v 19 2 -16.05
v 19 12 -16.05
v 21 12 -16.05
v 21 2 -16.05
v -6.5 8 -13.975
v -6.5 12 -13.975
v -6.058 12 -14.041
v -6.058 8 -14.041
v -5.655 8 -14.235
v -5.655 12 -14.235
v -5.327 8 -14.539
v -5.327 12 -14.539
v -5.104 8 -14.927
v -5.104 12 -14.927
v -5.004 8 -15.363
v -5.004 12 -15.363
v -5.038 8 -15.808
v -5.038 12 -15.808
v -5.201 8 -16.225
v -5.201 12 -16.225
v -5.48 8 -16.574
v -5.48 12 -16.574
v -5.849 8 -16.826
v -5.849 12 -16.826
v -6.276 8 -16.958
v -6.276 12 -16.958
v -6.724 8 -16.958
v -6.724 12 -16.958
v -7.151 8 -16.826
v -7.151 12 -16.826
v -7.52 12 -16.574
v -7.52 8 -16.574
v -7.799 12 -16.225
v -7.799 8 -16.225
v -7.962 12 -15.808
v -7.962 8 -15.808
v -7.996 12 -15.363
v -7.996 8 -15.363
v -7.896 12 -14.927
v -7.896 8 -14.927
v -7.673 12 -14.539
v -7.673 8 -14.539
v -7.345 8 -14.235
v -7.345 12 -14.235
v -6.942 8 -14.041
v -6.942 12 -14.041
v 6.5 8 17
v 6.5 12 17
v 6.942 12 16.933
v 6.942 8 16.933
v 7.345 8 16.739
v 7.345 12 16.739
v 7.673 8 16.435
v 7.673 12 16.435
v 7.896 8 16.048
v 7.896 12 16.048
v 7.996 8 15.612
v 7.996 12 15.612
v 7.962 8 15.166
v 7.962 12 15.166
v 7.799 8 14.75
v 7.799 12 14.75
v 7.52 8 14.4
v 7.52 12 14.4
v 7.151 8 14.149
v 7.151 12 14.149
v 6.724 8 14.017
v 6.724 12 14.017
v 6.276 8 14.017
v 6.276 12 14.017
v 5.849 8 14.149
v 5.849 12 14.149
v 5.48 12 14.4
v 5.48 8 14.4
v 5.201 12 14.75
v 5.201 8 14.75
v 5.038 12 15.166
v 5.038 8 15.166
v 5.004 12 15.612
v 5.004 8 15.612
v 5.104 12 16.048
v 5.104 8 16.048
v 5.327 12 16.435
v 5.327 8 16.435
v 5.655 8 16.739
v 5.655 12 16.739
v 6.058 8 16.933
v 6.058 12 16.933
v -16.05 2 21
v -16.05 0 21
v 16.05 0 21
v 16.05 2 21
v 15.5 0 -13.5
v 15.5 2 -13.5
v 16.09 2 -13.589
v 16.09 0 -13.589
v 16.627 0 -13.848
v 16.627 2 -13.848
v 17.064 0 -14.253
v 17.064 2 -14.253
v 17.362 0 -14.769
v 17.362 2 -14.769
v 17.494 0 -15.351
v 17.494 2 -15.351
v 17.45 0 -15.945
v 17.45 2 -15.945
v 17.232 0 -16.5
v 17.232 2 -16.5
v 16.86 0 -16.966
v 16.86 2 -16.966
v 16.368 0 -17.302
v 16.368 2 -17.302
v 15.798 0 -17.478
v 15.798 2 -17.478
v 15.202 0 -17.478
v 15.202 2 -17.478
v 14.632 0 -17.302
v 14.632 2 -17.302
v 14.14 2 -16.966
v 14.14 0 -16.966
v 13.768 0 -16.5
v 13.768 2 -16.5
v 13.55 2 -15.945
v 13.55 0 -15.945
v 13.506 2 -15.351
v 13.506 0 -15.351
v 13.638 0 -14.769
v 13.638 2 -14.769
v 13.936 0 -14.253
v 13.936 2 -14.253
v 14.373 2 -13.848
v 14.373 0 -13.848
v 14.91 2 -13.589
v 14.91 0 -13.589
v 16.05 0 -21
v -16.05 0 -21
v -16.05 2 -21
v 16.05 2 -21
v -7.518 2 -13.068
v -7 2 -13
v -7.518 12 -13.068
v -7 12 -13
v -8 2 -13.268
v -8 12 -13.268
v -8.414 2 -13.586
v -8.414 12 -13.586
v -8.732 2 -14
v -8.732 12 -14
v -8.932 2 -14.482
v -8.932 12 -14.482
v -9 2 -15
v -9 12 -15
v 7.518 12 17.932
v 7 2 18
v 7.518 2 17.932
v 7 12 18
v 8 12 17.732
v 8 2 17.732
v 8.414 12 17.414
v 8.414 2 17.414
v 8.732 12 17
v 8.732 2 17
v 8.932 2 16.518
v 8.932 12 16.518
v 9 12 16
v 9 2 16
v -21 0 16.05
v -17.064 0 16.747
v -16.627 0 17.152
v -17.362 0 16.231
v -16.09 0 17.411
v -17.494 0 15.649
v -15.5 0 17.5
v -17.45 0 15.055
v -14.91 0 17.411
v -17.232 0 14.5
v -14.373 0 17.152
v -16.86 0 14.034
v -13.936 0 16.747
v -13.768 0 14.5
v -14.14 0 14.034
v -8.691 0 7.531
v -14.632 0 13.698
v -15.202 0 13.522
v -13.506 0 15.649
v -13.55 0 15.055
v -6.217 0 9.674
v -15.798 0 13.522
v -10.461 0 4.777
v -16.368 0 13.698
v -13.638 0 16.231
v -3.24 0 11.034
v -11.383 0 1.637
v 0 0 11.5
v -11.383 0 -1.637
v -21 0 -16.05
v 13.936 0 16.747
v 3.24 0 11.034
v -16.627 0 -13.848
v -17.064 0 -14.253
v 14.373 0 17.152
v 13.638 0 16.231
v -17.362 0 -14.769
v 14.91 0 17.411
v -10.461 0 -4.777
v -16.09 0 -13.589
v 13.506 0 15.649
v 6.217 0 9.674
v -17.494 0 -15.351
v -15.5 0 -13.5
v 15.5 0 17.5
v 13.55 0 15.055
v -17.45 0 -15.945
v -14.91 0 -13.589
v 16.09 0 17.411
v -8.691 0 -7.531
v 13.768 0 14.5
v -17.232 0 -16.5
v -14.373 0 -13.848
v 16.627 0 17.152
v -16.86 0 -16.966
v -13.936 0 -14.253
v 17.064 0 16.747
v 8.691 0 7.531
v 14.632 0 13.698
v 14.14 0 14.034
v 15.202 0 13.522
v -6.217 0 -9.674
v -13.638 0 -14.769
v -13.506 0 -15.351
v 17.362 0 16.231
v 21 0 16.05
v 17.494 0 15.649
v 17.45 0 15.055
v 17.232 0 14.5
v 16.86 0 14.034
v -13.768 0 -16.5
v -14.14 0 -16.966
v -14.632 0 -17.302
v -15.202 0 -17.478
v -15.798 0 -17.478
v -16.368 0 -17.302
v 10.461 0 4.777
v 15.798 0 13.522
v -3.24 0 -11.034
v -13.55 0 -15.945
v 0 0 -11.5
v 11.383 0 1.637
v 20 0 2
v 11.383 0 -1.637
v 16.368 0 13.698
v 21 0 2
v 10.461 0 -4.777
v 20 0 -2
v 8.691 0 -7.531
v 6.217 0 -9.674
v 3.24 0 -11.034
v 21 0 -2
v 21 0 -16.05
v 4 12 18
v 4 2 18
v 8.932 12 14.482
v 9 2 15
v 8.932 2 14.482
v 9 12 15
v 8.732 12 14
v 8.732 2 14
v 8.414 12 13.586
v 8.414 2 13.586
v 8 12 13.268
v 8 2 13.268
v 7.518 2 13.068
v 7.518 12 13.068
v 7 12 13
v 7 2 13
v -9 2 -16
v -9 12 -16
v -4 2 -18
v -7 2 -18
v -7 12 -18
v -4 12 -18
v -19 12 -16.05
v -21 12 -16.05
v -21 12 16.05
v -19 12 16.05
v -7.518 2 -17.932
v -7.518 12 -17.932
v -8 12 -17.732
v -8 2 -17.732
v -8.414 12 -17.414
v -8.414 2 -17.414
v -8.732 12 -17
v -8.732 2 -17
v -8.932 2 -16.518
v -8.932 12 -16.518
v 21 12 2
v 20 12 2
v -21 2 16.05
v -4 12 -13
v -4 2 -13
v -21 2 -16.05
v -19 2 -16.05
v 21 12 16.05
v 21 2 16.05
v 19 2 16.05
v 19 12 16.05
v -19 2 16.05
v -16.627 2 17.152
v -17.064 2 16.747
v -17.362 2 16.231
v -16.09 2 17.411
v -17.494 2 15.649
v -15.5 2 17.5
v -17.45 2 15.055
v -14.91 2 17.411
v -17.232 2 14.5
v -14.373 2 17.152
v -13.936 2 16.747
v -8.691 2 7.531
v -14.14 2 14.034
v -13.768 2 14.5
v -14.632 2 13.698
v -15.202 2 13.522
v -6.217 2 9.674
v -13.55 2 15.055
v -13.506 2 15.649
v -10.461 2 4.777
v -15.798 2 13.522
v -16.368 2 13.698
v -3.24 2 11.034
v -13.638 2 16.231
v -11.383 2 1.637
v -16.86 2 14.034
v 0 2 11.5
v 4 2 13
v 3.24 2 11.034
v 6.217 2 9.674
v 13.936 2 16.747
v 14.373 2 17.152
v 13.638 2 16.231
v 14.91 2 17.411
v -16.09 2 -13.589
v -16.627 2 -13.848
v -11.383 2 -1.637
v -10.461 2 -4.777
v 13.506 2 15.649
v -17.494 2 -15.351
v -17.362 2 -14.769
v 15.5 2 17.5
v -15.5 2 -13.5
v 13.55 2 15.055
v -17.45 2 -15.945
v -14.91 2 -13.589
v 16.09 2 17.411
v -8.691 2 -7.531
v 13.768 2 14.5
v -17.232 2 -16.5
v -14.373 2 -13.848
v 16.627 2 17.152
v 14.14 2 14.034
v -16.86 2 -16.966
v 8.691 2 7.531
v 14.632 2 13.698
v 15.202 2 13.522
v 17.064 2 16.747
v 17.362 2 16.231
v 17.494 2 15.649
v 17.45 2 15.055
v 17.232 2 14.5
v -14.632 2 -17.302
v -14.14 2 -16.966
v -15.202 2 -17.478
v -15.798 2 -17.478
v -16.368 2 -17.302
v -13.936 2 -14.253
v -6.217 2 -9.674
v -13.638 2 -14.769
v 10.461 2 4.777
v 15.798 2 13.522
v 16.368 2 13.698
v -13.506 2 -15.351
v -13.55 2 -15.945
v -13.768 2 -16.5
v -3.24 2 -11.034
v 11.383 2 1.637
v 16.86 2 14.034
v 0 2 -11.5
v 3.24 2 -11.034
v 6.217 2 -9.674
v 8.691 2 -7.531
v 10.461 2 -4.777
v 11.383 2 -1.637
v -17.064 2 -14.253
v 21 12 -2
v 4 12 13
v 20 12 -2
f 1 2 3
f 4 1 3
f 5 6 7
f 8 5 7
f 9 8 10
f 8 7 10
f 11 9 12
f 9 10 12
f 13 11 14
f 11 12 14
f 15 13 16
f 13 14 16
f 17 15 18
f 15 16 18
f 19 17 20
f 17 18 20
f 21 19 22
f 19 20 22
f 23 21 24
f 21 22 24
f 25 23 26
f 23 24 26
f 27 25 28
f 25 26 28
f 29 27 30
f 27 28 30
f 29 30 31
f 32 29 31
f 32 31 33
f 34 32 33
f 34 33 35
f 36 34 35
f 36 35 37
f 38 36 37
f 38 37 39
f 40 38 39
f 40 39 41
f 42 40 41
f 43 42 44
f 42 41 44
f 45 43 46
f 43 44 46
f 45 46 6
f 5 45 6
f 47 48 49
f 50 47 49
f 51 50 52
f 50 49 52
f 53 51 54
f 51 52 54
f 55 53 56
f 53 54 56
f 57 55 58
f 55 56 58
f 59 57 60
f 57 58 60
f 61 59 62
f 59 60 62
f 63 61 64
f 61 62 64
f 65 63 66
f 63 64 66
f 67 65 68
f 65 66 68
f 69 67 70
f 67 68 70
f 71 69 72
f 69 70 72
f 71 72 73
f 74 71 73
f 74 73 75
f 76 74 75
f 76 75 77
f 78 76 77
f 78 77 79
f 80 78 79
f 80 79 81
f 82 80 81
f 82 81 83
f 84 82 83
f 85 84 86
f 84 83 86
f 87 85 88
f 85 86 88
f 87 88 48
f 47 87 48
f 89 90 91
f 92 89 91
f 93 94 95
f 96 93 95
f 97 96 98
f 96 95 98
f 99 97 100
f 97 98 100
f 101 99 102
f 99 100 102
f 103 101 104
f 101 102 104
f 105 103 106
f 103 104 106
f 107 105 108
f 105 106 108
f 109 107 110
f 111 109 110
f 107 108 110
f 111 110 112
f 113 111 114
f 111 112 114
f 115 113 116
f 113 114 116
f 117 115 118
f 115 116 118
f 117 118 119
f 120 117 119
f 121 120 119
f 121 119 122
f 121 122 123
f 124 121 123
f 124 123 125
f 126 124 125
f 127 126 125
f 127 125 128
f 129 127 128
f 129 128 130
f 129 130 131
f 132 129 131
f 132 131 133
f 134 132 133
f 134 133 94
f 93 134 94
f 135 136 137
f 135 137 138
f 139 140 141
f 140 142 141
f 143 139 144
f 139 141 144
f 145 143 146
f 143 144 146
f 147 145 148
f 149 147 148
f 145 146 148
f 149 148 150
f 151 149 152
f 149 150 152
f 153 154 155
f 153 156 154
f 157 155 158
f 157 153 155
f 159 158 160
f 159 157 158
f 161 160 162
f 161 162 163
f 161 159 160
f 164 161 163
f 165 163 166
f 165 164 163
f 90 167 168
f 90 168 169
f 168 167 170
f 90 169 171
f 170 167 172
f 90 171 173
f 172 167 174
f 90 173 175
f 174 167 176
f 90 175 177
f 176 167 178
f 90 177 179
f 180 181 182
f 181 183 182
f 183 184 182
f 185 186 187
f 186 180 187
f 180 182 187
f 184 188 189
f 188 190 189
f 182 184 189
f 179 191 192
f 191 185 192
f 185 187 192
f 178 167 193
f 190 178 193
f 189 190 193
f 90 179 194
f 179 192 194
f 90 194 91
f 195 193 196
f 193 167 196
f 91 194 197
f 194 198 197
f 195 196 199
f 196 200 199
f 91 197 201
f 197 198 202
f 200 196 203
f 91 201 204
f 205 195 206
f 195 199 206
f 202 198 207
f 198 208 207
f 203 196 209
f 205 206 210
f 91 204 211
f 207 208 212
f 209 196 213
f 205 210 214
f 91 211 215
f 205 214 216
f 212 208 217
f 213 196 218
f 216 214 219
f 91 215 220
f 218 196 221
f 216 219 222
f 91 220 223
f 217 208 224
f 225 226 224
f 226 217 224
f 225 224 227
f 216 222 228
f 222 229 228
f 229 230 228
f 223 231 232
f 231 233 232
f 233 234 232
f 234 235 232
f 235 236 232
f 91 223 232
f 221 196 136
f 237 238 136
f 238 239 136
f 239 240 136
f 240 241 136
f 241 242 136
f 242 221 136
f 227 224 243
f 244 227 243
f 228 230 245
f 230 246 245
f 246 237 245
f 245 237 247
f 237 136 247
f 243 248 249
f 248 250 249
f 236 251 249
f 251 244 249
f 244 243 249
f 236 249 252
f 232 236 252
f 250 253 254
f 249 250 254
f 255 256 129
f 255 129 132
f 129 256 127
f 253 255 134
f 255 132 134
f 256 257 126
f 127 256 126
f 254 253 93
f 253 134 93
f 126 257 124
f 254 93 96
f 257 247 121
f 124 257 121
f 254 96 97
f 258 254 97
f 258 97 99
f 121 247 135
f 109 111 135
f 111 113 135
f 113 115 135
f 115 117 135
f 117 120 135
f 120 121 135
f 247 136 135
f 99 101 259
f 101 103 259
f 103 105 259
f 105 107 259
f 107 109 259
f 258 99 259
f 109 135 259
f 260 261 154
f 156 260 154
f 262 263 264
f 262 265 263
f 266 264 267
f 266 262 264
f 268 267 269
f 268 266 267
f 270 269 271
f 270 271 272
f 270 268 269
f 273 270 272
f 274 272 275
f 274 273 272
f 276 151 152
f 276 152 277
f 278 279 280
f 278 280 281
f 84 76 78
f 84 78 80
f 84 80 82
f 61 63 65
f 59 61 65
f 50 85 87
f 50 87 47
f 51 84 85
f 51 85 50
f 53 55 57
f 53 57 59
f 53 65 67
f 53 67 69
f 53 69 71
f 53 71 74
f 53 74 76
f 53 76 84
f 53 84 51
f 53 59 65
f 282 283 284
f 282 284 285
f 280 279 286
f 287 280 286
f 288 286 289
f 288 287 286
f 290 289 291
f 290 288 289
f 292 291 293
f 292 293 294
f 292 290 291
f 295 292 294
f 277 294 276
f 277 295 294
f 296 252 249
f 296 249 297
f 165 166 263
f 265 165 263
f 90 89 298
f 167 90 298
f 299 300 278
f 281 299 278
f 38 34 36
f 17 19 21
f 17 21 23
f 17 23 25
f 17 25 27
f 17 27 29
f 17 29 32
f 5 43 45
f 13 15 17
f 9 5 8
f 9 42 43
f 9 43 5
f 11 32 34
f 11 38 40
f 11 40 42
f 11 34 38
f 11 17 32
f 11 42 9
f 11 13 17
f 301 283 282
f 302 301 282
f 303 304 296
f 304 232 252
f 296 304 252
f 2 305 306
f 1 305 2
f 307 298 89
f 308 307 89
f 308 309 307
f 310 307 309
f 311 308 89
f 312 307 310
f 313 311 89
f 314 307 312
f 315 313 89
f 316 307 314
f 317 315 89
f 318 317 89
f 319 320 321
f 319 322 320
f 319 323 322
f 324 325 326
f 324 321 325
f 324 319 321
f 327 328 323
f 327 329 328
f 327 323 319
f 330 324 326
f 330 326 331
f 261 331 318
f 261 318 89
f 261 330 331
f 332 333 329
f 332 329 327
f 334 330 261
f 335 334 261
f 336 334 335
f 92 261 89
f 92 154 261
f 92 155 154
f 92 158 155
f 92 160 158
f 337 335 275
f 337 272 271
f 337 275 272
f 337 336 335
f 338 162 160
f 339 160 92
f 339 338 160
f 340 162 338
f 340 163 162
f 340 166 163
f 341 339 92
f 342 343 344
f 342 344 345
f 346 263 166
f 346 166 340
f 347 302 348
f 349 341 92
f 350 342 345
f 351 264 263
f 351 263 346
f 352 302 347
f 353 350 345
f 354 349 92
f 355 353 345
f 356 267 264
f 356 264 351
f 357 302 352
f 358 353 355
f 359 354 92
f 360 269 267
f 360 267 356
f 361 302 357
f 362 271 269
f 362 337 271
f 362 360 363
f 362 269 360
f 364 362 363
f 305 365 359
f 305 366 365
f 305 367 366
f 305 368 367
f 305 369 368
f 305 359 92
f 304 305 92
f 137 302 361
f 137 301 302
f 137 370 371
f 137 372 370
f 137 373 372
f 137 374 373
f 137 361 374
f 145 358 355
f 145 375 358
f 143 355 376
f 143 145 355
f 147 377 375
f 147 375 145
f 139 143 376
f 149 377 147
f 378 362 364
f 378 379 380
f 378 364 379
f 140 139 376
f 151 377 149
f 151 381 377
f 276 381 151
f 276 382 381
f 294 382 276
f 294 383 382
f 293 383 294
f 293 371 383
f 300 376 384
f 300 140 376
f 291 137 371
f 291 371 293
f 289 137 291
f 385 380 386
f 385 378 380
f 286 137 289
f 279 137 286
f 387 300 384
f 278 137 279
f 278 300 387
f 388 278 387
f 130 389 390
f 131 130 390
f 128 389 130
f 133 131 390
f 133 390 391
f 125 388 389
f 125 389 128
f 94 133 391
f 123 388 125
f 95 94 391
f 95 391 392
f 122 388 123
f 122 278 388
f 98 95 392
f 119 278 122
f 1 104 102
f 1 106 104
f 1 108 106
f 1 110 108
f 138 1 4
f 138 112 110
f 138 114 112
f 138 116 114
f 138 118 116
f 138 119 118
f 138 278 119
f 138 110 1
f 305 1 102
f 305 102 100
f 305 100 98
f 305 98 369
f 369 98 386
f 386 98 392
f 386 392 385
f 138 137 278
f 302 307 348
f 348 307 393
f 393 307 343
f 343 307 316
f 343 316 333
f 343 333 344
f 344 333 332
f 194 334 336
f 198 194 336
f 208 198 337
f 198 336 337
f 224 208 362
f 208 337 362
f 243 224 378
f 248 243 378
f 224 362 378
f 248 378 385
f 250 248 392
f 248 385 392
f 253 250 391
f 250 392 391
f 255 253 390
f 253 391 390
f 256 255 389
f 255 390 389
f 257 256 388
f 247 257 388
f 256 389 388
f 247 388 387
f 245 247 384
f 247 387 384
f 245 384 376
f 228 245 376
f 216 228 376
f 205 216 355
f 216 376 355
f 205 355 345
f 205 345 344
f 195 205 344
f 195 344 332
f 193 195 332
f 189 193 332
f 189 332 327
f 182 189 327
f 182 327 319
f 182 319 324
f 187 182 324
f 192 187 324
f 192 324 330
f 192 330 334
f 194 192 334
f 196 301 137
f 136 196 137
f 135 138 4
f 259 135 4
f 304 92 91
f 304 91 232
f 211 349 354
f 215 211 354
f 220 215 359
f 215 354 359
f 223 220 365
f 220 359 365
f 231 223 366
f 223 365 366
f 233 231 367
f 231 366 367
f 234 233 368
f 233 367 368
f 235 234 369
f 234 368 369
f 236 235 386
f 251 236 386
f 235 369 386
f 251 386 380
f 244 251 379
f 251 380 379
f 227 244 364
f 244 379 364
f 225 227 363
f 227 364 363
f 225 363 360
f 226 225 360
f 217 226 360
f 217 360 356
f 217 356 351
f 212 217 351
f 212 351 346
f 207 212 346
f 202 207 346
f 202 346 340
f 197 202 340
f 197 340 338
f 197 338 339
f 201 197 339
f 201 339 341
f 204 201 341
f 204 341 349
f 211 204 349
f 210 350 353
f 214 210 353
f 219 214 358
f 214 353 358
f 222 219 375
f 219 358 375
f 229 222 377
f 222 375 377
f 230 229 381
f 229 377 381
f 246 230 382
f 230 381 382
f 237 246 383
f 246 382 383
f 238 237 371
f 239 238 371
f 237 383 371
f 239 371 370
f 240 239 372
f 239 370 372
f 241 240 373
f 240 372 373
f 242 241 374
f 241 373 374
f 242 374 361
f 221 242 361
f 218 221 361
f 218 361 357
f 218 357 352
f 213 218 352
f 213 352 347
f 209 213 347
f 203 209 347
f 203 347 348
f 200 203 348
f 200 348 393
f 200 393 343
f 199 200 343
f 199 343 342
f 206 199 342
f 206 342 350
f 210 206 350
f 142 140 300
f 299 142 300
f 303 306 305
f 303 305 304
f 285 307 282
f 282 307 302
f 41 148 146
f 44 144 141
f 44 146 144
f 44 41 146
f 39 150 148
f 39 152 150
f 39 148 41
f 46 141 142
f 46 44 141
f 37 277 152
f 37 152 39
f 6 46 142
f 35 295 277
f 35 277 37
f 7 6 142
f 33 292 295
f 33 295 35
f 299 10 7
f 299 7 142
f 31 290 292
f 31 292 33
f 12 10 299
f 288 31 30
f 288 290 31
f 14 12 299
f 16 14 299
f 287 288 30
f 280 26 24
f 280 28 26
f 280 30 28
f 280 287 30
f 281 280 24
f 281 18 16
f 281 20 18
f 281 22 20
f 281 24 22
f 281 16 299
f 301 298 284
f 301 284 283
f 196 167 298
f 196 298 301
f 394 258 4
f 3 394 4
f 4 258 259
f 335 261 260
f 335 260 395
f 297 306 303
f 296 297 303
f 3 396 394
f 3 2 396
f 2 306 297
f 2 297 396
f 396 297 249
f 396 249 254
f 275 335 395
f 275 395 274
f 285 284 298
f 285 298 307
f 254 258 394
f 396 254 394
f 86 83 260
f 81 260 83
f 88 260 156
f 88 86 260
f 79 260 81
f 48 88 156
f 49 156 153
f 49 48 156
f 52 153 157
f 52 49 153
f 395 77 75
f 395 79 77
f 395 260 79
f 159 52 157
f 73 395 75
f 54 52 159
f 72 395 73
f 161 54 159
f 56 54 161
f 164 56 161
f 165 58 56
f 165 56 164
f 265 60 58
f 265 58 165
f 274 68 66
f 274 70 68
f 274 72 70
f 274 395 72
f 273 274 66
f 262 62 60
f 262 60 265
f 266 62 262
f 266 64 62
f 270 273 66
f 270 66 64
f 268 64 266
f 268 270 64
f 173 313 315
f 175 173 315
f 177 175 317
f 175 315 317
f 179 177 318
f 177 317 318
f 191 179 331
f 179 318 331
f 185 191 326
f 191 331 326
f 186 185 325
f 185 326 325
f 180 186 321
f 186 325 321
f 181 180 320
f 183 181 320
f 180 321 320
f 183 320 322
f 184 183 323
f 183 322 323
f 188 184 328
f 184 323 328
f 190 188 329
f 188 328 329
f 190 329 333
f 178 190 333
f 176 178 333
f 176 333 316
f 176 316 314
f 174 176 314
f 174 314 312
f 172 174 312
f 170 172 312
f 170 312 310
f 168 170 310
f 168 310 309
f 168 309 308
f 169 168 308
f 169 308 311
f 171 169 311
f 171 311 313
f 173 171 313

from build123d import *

# Parameters (mm, degrees)
SKETCH1_W           = 42
SKETCH1_H           = 42
BOSS_EXTRUDE1_DEPTH = 2
SKETCH2_R           = 11.5
CUT_EXTRUDE1_DEPTH  = 30.765752132
SKETCH3_R           = 2
CUT_EXTRUDE2_DEPTH  = 30.765752132
CUT_EXTRUDE3_DEPTH  = 30.765752132
SKETCH5_W           = 2
SKETCH5_H           = 32.100505064
BOSS_EXTRUDE2_DEPTH = 10
SKETCH6_W           = 5
SKETCH6_H           = 5
BOSS_EXTRUDE3_DEPTH = 10
SKETCH9_W           = 4
SKETCH9_H           = 12
CUT_EXTRUDE4_DEPTH  = 1
SKETCH11_R          = 1.5
CUT_EXTRUDE5_DEPTH  = 4
FILLET1_R           = 2


with BuildPart() as part:
    # Sketch1 → Boss-Extrude1 (new body)
    with BuildSketch(Plane(origin=(0, 0, 0), x_dir=(1, 0, 0), z_dir=(0, 1, 0))):
        Rectangle(SKETCH1_W, SKETCH1_H)
    extrude(amount=BOSS_EXTRUDE1_DEPTH)

    # Sketch2 → Cut-Extrude1 (cut, through all)
    with BuildSketch(Plane(origin=(0, 2, 0), x_dir=(1, 0, 0), z_dir=(0, 1, 0))):
        with Locations(Location((0, 0, 0), (0, 0, 270))):
            Circle(SKETCH2_R)
    extrude(amount=-CUT_EXTRUDE1_DEPTH, mode=Mode.SUBTRACT)

    # Sketch3 → Cut-Extrude2 (cut, through all)
    with BuildSketch(Plane(origin=(0, 2, 0), x_dir=(1, 0, 0), z_dir=(0, 1, 0))):
        with Locations(Location((-15.5, 15.5, 0), (0, 0, 270))):
            Circle(SKETCH3_R)
        with Locations(Location((15.5, 15.5, 0), (0, 0, 270))):
            Circle(SKETCH3_R)
        with Locations(Location((15.5, -15.5, 0), (0, 0, 270))):
            Circle(SKETCH3_R)
        with Locations(Location((-15.5, -15.5, 0), (0, 0, 270))):
            Circle(SKETCH3_R)
    extrude(amount=-CUT_EXTRUDE2_DEPTH, mode=Mode.SUBTRACT)

    # Sketch4 → Cut-Extrude3 (cut, through all)
    with BuildSketch(Plane(origin=(0, 2, 0), x_dir=(1, 0, 0), z_dir=(0, 1, 0))):
        Polygon((-21, 16.050252532), (-16.050252532, 21), (-21, 21), align=None)
        Polygon((-21, -21), (-16.050252532, -21), (-21, -16.050252532), align=None)
        Polygon((21, -21), (16.050252532, -21), (21, -16.050252532), align=None)
        Polygon((16.050252532, 21), (21, 16.050252532), (21, 21), align=None)
    extrude(amount=-CUT_EXTRUDE3_DEPTH, mode=Mode.SUBTRACT)

    # Sketch5 → Boss-Extrude2 (add)
    with BuildSketch(Plane(origin=(0, 2, 0), x_dir=(1, 0, 0), z_dir=(0, 1, 0))):
        with Locations((-20, 0)):
            Rectangle(SKETCH5_W, SKETCH5_H)
        with Locations((20, 0)):
            Rectangle(SKETCH5_W, SKETCH5_H)
    extrude(amount=BOSS_EXTRUDE2_DEPTH)

    # Sketch6 → Boss-Extrude3 (add)
    with BuildSketch(Plane(origin=(0, 2, 0), x_dir=(1, 0, 0), z_dir=(0, 1, 0))):
        with Locations((6.5, -15.5)):
            Rectangle(SKETCH6_W, SKETCH6_H)
        with Locations((-6.5, 15.5)):
            Rectangle(SKETCH6_W, SKETCH6_H)
    extrude(amount=BOSS_EXTRUDE3_DEPTH)

    # Sketch9 → Cut-Extrude4 (cut)
    with BuildSketch(Plane(origin=(21, 0, 0), x_dir=(0, 0, -1), z_dir=(1, 0, 0))):
        with Locations((0, 6)):
            Rectangle(SKETCH9_W, SKETCH9_H)
    extrude(amount=-CUT_EXTRUDE4_DEPTH, mode=Mode.SUBTRACT)

    # Sketch11 → Cut-Extrude5 (cut)
    with BuildSketch(Plane(origin=(0, 12, 0), x_dir=(1, 0, 0), z_dir=(0, 1, 0))):
        with Locations(Location((-6.5, 15.474657956, 0), (0, 0, 270))):
            Circle(SKETCH11_R)
        with Locations(Location((6.5, -15.5, 0), (0, 0, 270))):
            Circle(SKETCH11_R)
    extrude(amount=-CUT_EXTRUDE5_DEPTH, mode=Mode.SUBTRACT)

    # Fillet1
    fillet1_edges = [part.edges().sort_by_distance(p)[0] for p in [
        (9, 7, 18),
        (9, 7, 13),
        (-9, 7, -18),
        (-9, 7, -13),
    ]]
    fillet(fillet1_edges, radius=FILLET1_R)


solid = part.part
